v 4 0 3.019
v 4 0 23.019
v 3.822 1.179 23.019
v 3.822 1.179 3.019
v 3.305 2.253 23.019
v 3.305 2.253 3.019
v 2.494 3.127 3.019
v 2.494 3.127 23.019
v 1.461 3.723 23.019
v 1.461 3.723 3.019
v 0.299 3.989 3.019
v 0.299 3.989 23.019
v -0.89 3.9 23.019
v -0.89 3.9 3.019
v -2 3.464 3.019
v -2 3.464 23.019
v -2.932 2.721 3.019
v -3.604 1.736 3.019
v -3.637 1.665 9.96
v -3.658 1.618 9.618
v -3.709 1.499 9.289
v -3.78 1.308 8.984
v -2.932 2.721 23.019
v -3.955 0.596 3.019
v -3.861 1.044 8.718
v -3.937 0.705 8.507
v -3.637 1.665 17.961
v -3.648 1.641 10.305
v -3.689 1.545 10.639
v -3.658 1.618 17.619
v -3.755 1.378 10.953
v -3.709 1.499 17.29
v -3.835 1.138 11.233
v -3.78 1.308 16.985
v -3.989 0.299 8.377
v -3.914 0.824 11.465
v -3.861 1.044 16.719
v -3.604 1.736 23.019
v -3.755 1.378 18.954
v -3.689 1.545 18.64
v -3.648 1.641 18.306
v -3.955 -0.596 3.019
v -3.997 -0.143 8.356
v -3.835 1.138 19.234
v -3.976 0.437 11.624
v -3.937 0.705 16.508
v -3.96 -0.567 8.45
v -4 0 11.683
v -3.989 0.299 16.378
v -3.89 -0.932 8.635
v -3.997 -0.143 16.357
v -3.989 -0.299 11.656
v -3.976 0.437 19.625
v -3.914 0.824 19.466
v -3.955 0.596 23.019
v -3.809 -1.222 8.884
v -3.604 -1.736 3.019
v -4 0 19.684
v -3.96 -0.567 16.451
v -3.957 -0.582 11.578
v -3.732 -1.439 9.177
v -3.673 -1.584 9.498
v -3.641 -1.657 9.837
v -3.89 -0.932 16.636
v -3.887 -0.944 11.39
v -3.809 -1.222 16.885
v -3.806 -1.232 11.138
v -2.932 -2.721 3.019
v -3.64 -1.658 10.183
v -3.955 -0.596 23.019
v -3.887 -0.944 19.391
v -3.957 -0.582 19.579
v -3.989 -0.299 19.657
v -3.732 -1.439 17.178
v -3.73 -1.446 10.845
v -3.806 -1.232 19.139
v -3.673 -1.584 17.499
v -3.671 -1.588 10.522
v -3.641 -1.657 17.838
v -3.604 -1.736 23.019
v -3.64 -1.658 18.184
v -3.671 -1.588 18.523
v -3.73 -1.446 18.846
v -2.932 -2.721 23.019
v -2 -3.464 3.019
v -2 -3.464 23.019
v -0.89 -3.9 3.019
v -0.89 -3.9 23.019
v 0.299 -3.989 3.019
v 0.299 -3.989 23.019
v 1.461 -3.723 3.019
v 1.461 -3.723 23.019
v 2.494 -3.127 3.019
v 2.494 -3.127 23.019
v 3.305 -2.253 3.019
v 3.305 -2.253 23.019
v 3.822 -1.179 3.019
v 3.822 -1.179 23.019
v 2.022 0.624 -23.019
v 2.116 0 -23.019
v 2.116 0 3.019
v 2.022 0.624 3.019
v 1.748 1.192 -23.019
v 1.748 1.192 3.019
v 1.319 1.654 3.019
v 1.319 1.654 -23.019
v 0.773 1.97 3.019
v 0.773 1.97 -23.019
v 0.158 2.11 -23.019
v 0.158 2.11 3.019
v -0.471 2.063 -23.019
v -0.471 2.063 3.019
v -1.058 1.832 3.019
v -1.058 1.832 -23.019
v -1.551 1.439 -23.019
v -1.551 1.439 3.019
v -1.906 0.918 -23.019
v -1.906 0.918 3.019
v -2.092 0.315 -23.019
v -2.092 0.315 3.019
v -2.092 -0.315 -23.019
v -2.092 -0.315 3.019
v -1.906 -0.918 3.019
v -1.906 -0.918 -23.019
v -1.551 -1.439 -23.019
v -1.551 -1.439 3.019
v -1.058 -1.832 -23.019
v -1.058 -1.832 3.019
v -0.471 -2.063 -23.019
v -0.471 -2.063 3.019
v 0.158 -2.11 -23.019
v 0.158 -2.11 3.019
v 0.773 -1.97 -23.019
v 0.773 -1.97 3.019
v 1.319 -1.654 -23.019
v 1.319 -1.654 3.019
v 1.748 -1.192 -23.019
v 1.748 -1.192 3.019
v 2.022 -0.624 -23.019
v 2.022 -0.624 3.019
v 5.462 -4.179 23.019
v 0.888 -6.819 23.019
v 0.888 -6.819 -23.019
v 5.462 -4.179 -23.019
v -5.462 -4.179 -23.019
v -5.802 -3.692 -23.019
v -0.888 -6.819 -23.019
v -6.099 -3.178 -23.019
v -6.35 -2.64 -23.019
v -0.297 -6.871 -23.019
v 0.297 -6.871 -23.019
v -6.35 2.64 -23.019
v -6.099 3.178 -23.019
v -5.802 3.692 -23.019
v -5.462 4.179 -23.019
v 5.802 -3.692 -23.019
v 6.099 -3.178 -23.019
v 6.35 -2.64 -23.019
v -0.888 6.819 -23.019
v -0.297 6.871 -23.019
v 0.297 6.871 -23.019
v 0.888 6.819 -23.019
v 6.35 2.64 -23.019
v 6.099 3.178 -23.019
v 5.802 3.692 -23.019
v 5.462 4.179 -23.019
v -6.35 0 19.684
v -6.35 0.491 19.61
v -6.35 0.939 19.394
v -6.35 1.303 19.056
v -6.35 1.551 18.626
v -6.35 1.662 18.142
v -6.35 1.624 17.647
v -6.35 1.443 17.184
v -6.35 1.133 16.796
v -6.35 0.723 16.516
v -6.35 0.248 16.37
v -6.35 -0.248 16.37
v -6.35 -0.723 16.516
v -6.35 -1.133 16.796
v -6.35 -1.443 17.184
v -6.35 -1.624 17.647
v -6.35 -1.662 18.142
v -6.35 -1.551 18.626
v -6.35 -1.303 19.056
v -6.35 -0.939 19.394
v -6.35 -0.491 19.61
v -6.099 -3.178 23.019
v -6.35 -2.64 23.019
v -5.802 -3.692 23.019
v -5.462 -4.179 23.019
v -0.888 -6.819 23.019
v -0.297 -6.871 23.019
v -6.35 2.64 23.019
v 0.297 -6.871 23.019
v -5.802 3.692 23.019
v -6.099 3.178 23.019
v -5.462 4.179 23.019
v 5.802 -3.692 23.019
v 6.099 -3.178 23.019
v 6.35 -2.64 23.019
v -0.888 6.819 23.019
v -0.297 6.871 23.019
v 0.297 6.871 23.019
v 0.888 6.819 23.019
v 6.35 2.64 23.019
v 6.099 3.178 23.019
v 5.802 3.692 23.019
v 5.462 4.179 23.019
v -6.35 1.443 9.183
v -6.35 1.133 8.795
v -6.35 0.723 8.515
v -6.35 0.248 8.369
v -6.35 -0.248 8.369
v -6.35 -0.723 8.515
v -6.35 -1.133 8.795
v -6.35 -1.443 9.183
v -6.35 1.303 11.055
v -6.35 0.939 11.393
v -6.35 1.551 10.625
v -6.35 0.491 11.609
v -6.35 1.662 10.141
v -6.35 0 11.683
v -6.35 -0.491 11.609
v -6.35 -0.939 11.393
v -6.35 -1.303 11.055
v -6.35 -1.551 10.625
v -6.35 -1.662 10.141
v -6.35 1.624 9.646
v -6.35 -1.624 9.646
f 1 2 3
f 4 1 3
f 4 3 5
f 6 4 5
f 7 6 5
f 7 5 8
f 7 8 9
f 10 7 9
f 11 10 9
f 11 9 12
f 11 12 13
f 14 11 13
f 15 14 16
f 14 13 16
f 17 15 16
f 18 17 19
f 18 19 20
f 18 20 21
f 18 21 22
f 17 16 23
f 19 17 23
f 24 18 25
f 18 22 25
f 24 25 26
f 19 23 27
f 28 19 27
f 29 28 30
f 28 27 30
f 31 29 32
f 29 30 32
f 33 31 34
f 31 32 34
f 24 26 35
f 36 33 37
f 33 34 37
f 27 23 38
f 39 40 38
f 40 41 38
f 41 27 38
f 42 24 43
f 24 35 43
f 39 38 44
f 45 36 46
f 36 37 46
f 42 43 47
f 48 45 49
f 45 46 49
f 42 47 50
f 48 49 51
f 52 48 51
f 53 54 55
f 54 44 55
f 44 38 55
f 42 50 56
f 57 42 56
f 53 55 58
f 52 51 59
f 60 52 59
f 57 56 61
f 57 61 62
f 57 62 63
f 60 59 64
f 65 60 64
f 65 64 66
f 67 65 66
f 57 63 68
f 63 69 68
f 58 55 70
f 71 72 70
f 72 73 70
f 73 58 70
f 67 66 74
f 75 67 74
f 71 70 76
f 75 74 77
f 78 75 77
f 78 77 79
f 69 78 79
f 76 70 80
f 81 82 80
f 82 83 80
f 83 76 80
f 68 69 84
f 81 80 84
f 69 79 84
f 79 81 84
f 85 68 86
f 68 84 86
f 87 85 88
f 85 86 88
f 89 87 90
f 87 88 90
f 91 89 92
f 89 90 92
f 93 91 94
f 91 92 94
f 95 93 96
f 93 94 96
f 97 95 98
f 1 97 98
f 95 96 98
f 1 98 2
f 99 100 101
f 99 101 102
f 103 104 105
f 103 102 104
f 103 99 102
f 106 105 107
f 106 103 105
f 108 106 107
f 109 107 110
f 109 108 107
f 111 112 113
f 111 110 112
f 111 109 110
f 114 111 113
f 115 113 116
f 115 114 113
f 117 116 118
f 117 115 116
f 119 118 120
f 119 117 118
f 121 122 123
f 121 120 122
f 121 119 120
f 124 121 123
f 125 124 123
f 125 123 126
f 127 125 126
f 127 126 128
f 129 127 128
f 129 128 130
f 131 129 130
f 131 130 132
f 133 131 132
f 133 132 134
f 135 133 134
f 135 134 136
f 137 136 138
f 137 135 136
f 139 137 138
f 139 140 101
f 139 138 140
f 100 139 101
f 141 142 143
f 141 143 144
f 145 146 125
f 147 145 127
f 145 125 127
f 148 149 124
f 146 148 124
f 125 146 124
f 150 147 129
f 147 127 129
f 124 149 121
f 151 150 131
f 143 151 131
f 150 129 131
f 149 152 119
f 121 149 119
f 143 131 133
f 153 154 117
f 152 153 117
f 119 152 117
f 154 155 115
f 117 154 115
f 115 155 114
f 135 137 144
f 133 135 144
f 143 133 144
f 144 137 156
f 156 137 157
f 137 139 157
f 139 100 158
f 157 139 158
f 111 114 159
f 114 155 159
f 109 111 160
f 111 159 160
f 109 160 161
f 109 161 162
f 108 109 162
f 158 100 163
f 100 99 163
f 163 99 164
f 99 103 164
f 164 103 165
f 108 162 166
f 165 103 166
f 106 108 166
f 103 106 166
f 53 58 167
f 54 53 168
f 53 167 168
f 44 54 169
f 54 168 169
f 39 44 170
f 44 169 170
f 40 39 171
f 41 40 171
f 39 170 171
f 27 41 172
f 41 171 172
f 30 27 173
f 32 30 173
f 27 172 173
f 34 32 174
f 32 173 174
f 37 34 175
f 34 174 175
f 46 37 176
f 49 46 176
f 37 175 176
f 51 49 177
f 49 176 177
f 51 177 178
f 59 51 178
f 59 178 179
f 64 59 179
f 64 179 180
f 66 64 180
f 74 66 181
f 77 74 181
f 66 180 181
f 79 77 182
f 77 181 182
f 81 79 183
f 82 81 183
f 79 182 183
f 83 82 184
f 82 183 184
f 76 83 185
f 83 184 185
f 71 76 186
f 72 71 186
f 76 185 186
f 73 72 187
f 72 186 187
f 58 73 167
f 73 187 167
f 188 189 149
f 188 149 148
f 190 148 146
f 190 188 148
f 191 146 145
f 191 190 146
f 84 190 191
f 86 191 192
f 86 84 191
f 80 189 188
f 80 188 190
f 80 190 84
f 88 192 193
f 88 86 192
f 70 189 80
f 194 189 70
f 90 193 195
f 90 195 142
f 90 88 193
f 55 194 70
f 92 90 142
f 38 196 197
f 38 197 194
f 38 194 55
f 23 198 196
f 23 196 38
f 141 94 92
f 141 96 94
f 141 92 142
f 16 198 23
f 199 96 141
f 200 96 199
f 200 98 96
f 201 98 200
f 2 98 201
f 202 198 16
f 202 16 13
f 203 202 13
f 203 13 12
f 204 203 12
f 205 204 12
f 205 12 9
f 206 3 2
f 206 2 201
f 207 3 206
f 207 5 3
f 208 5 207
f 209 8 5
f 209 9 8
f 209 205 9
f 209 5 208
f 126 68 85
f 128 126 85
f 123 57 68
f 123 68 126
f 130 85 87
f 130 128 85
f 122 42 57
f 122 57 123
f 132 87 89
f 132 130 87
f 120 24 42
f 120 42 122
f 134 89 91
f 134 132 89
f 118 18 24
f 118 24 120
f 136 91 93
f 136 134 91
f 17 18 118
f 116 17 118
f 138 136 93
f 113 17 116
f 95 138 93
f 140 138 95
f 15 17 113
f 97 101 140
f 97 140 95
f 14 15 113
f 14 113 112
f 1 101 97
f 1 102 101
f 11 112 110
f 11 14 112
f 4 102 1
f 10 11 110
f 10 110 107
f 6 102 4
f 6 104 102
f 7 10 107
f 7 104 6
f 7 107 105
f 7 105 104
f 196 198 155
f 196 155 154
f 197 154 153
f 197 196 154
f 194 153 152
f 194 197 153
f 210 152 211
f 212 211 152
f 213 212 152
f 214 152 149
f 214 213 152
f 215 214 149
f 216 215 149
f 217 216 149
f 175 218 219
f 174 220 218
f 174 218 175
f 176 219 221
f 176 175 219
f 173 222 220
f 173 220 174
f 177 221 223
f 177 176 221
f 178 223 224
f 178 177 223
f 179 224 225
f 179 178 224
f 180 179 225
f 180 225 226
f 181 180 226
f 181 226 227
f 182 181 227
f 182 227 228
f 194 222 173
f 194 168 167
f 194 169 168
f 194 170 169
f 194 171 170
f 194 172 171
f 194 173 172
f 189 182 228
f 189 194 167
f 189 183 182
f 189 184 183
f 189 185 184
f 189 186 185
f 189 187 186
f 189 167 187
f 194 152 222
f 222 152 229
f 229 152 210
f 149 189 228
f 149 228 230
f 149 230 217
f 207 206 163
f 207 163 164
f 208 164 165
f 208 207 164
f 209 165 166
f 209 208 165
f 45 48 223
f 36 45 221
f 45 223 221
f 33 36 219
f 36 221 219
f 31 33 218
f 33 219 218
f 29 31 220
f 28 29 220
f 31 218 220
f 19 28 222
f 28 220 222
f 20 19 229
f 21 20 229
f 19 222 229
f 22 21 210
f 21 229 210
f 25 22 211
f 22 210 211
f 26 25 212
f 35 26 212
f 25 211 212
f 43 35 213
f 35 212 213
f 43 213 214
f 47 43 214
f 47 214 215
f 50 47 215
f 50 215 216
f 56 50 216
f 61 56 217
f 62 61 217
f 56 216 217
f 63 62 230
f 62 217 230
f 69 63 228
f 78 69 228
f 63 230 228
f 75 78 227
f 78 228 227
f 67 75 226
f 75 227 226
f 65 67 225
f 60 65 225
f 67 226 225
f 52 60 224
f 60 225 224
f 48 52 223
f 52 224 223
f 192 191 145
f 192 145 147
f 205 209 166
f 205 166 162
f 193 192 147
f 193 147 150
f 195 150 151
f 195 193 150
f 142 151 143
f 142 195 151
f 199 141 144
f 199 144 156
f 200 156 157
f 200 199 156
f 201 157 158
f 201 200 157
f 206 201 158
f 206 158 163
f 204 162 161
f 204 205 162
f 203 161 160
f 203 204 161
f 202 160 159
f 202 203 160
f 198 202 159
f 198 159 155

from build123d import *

# Parameters (mm, degrees)
BASIC_ROD_DEPTH         = 23.01875
BASIC_ROD_DEPTH_BACK    = 23.01875
SKETCH1_R               = 6.35
THEX_DEPTH              = 23.01875
INTERNAL_CUT_DEPTH      = 25.849128119
INTERNAL_CUT_DEPTH_BACK = 25.849128119
SKETCH2_R               = 2.11582
SKETCH9_R               = 4
CUT_EXTRUDE1_DEPTH      = 19.99996
CUT_EXTRUDE2_REACH      = 29.174
CUT_EXTRUDE2_END_RADIUS = 4
SKETCH10_R              = 1.66624


with BuildPart() as part:
    # Sketch1 → Basic Rod (new, two sides: drawn at the far end of the back side and taken through both)
    with BuildSketch(Plane.XY.offset(-BASIC_ROD_DEPTH_BACK)):
        Circle(SKETCH1_R)
    extrude(amount=BASIC_ROD_DEPTH + BASIC_ROD_DEPTH_BACK)

    # Sketch8 → THex (add, symmetric)
    with BuildSketch(Plane.XY):
        with BuildLine():
            Line((-0.888411378, 6.819423871), (-5.461588622, 4.179098758))
            ThreePointArc((-5.461588622, 4.179098758), (-5.955700003, 3.438525), (-6.35, 2.640325113))
            Line((-6.35, 2.640325113), (-6.35, -2.640325113))
            ThreePointArc((-6.35, -2.640325113), (-5.955700003, -3.438525), (-5.461588622, -4.179098758))
            Line((-5.461588622, -4.179098758), (-0.888411378, -6.819423871))
            ThreePointArc((-0.888411378, -6.819423871), (0, -6.87705), (0.888411378, -6.819423871))
            Line((0.888411378, -6.819423871), (5.461588622, -4.179098758))
            ThreePointArc((5.461588622, -4.179098758), (5.955700003, -3.438525), (6.35, -2.640325113))
            Line((6.35, -2.640325113), (6.35, 2.640325113))
            ThreePointArc((6.35, 2.640325113), (5.955700003, 3.438525), (5.461588622, 4.179098758))
            Line((5.461588622, 4.179098758), (0.888411378, 6.819423871))
            ThreePointArc((0.888411378, 6.819423871), (0, 6.87705), (-0.888411378, 6.819423871))
        make_face()
    extrude(amount=THEX_DEPTH, both=True)

    # Sketch2 → Internal Cut (cut, two sides: drawn at the far end of the back side and taken through both)
    with BuildSketch(Plane.XY.offset(-INTERNAL_CUT_DEPTH_BACK)):
        Circle(SKETCH2_R)
    extrude(amount=INTERNAL_CUT_DEPTH + INTERNAL_CUT_DEPTH_BACK, mode=Mode.SUBTRACT)

    # Sketch9 → Cut-Extrude1 (cut)
    with BuildSketch(Plane.XY.offset(23.01875)):
        Circle(SKETCH9_R)
    extrude(amount=-CUT_EXTRUDE1_DEPTH, mode=Mode.SUBTRACT)

    # Cut-Extrude2: up to this cylinder (the profile starts outside it)
    cut_extrude2_end = Plane(origin=(0, 0, 14.01699), z_dir=(0, 0, 1)) * Cylinder(CUT_EXTRUDE2_END_RADIUS, 75.349, mode=Mode.PRIVATE)
    # Sketch10 → Cut-Extrude2 (cut, up to the surface)
    with BuildSketch(Plane.ZY.offset(6.35), mode=Mode.PRIVATE) as cut_extrude2_sk1:
        with Locations((10.01649, 0)):
            Circle(SKETCH10_R)
    cut_extrude2_tool1 = extrude(cut_extrude2_sk1.sketch, amount=-CUT_EXTRUDE2_REACH, mode=Mode.PRIVATE) - cut_extrude2_end
    add(cut_extrude2_tool1.solids().sort_by_distance((-6.35, 0, 10.01649))[0], mode=Mode.SUBTRACT)
    # Sketch10 → Cut-Extrude2 (cut, up to the surface)
    with BuildSketch(Plane.ZY.offset(6.35), mode=Mode.PRIVATE) as cut_extrude2_sk2:
        with Locations((18.01749, 0)):
            Circle(SKETCH10_R)
    cut_extrude2_tool2 = extrude(cut_extrude2_sk2.sketch, amount=-CUT_EXTRUDE2_REACH, mode=Mode.PRIVATE) - cut_extrude2_end
    add(cut_extrude2_tool2.solids().sort_by_distance((-6.35, 0, 18.01749))[0], mode=Mode.SUBTRACT)


solid = part.part
